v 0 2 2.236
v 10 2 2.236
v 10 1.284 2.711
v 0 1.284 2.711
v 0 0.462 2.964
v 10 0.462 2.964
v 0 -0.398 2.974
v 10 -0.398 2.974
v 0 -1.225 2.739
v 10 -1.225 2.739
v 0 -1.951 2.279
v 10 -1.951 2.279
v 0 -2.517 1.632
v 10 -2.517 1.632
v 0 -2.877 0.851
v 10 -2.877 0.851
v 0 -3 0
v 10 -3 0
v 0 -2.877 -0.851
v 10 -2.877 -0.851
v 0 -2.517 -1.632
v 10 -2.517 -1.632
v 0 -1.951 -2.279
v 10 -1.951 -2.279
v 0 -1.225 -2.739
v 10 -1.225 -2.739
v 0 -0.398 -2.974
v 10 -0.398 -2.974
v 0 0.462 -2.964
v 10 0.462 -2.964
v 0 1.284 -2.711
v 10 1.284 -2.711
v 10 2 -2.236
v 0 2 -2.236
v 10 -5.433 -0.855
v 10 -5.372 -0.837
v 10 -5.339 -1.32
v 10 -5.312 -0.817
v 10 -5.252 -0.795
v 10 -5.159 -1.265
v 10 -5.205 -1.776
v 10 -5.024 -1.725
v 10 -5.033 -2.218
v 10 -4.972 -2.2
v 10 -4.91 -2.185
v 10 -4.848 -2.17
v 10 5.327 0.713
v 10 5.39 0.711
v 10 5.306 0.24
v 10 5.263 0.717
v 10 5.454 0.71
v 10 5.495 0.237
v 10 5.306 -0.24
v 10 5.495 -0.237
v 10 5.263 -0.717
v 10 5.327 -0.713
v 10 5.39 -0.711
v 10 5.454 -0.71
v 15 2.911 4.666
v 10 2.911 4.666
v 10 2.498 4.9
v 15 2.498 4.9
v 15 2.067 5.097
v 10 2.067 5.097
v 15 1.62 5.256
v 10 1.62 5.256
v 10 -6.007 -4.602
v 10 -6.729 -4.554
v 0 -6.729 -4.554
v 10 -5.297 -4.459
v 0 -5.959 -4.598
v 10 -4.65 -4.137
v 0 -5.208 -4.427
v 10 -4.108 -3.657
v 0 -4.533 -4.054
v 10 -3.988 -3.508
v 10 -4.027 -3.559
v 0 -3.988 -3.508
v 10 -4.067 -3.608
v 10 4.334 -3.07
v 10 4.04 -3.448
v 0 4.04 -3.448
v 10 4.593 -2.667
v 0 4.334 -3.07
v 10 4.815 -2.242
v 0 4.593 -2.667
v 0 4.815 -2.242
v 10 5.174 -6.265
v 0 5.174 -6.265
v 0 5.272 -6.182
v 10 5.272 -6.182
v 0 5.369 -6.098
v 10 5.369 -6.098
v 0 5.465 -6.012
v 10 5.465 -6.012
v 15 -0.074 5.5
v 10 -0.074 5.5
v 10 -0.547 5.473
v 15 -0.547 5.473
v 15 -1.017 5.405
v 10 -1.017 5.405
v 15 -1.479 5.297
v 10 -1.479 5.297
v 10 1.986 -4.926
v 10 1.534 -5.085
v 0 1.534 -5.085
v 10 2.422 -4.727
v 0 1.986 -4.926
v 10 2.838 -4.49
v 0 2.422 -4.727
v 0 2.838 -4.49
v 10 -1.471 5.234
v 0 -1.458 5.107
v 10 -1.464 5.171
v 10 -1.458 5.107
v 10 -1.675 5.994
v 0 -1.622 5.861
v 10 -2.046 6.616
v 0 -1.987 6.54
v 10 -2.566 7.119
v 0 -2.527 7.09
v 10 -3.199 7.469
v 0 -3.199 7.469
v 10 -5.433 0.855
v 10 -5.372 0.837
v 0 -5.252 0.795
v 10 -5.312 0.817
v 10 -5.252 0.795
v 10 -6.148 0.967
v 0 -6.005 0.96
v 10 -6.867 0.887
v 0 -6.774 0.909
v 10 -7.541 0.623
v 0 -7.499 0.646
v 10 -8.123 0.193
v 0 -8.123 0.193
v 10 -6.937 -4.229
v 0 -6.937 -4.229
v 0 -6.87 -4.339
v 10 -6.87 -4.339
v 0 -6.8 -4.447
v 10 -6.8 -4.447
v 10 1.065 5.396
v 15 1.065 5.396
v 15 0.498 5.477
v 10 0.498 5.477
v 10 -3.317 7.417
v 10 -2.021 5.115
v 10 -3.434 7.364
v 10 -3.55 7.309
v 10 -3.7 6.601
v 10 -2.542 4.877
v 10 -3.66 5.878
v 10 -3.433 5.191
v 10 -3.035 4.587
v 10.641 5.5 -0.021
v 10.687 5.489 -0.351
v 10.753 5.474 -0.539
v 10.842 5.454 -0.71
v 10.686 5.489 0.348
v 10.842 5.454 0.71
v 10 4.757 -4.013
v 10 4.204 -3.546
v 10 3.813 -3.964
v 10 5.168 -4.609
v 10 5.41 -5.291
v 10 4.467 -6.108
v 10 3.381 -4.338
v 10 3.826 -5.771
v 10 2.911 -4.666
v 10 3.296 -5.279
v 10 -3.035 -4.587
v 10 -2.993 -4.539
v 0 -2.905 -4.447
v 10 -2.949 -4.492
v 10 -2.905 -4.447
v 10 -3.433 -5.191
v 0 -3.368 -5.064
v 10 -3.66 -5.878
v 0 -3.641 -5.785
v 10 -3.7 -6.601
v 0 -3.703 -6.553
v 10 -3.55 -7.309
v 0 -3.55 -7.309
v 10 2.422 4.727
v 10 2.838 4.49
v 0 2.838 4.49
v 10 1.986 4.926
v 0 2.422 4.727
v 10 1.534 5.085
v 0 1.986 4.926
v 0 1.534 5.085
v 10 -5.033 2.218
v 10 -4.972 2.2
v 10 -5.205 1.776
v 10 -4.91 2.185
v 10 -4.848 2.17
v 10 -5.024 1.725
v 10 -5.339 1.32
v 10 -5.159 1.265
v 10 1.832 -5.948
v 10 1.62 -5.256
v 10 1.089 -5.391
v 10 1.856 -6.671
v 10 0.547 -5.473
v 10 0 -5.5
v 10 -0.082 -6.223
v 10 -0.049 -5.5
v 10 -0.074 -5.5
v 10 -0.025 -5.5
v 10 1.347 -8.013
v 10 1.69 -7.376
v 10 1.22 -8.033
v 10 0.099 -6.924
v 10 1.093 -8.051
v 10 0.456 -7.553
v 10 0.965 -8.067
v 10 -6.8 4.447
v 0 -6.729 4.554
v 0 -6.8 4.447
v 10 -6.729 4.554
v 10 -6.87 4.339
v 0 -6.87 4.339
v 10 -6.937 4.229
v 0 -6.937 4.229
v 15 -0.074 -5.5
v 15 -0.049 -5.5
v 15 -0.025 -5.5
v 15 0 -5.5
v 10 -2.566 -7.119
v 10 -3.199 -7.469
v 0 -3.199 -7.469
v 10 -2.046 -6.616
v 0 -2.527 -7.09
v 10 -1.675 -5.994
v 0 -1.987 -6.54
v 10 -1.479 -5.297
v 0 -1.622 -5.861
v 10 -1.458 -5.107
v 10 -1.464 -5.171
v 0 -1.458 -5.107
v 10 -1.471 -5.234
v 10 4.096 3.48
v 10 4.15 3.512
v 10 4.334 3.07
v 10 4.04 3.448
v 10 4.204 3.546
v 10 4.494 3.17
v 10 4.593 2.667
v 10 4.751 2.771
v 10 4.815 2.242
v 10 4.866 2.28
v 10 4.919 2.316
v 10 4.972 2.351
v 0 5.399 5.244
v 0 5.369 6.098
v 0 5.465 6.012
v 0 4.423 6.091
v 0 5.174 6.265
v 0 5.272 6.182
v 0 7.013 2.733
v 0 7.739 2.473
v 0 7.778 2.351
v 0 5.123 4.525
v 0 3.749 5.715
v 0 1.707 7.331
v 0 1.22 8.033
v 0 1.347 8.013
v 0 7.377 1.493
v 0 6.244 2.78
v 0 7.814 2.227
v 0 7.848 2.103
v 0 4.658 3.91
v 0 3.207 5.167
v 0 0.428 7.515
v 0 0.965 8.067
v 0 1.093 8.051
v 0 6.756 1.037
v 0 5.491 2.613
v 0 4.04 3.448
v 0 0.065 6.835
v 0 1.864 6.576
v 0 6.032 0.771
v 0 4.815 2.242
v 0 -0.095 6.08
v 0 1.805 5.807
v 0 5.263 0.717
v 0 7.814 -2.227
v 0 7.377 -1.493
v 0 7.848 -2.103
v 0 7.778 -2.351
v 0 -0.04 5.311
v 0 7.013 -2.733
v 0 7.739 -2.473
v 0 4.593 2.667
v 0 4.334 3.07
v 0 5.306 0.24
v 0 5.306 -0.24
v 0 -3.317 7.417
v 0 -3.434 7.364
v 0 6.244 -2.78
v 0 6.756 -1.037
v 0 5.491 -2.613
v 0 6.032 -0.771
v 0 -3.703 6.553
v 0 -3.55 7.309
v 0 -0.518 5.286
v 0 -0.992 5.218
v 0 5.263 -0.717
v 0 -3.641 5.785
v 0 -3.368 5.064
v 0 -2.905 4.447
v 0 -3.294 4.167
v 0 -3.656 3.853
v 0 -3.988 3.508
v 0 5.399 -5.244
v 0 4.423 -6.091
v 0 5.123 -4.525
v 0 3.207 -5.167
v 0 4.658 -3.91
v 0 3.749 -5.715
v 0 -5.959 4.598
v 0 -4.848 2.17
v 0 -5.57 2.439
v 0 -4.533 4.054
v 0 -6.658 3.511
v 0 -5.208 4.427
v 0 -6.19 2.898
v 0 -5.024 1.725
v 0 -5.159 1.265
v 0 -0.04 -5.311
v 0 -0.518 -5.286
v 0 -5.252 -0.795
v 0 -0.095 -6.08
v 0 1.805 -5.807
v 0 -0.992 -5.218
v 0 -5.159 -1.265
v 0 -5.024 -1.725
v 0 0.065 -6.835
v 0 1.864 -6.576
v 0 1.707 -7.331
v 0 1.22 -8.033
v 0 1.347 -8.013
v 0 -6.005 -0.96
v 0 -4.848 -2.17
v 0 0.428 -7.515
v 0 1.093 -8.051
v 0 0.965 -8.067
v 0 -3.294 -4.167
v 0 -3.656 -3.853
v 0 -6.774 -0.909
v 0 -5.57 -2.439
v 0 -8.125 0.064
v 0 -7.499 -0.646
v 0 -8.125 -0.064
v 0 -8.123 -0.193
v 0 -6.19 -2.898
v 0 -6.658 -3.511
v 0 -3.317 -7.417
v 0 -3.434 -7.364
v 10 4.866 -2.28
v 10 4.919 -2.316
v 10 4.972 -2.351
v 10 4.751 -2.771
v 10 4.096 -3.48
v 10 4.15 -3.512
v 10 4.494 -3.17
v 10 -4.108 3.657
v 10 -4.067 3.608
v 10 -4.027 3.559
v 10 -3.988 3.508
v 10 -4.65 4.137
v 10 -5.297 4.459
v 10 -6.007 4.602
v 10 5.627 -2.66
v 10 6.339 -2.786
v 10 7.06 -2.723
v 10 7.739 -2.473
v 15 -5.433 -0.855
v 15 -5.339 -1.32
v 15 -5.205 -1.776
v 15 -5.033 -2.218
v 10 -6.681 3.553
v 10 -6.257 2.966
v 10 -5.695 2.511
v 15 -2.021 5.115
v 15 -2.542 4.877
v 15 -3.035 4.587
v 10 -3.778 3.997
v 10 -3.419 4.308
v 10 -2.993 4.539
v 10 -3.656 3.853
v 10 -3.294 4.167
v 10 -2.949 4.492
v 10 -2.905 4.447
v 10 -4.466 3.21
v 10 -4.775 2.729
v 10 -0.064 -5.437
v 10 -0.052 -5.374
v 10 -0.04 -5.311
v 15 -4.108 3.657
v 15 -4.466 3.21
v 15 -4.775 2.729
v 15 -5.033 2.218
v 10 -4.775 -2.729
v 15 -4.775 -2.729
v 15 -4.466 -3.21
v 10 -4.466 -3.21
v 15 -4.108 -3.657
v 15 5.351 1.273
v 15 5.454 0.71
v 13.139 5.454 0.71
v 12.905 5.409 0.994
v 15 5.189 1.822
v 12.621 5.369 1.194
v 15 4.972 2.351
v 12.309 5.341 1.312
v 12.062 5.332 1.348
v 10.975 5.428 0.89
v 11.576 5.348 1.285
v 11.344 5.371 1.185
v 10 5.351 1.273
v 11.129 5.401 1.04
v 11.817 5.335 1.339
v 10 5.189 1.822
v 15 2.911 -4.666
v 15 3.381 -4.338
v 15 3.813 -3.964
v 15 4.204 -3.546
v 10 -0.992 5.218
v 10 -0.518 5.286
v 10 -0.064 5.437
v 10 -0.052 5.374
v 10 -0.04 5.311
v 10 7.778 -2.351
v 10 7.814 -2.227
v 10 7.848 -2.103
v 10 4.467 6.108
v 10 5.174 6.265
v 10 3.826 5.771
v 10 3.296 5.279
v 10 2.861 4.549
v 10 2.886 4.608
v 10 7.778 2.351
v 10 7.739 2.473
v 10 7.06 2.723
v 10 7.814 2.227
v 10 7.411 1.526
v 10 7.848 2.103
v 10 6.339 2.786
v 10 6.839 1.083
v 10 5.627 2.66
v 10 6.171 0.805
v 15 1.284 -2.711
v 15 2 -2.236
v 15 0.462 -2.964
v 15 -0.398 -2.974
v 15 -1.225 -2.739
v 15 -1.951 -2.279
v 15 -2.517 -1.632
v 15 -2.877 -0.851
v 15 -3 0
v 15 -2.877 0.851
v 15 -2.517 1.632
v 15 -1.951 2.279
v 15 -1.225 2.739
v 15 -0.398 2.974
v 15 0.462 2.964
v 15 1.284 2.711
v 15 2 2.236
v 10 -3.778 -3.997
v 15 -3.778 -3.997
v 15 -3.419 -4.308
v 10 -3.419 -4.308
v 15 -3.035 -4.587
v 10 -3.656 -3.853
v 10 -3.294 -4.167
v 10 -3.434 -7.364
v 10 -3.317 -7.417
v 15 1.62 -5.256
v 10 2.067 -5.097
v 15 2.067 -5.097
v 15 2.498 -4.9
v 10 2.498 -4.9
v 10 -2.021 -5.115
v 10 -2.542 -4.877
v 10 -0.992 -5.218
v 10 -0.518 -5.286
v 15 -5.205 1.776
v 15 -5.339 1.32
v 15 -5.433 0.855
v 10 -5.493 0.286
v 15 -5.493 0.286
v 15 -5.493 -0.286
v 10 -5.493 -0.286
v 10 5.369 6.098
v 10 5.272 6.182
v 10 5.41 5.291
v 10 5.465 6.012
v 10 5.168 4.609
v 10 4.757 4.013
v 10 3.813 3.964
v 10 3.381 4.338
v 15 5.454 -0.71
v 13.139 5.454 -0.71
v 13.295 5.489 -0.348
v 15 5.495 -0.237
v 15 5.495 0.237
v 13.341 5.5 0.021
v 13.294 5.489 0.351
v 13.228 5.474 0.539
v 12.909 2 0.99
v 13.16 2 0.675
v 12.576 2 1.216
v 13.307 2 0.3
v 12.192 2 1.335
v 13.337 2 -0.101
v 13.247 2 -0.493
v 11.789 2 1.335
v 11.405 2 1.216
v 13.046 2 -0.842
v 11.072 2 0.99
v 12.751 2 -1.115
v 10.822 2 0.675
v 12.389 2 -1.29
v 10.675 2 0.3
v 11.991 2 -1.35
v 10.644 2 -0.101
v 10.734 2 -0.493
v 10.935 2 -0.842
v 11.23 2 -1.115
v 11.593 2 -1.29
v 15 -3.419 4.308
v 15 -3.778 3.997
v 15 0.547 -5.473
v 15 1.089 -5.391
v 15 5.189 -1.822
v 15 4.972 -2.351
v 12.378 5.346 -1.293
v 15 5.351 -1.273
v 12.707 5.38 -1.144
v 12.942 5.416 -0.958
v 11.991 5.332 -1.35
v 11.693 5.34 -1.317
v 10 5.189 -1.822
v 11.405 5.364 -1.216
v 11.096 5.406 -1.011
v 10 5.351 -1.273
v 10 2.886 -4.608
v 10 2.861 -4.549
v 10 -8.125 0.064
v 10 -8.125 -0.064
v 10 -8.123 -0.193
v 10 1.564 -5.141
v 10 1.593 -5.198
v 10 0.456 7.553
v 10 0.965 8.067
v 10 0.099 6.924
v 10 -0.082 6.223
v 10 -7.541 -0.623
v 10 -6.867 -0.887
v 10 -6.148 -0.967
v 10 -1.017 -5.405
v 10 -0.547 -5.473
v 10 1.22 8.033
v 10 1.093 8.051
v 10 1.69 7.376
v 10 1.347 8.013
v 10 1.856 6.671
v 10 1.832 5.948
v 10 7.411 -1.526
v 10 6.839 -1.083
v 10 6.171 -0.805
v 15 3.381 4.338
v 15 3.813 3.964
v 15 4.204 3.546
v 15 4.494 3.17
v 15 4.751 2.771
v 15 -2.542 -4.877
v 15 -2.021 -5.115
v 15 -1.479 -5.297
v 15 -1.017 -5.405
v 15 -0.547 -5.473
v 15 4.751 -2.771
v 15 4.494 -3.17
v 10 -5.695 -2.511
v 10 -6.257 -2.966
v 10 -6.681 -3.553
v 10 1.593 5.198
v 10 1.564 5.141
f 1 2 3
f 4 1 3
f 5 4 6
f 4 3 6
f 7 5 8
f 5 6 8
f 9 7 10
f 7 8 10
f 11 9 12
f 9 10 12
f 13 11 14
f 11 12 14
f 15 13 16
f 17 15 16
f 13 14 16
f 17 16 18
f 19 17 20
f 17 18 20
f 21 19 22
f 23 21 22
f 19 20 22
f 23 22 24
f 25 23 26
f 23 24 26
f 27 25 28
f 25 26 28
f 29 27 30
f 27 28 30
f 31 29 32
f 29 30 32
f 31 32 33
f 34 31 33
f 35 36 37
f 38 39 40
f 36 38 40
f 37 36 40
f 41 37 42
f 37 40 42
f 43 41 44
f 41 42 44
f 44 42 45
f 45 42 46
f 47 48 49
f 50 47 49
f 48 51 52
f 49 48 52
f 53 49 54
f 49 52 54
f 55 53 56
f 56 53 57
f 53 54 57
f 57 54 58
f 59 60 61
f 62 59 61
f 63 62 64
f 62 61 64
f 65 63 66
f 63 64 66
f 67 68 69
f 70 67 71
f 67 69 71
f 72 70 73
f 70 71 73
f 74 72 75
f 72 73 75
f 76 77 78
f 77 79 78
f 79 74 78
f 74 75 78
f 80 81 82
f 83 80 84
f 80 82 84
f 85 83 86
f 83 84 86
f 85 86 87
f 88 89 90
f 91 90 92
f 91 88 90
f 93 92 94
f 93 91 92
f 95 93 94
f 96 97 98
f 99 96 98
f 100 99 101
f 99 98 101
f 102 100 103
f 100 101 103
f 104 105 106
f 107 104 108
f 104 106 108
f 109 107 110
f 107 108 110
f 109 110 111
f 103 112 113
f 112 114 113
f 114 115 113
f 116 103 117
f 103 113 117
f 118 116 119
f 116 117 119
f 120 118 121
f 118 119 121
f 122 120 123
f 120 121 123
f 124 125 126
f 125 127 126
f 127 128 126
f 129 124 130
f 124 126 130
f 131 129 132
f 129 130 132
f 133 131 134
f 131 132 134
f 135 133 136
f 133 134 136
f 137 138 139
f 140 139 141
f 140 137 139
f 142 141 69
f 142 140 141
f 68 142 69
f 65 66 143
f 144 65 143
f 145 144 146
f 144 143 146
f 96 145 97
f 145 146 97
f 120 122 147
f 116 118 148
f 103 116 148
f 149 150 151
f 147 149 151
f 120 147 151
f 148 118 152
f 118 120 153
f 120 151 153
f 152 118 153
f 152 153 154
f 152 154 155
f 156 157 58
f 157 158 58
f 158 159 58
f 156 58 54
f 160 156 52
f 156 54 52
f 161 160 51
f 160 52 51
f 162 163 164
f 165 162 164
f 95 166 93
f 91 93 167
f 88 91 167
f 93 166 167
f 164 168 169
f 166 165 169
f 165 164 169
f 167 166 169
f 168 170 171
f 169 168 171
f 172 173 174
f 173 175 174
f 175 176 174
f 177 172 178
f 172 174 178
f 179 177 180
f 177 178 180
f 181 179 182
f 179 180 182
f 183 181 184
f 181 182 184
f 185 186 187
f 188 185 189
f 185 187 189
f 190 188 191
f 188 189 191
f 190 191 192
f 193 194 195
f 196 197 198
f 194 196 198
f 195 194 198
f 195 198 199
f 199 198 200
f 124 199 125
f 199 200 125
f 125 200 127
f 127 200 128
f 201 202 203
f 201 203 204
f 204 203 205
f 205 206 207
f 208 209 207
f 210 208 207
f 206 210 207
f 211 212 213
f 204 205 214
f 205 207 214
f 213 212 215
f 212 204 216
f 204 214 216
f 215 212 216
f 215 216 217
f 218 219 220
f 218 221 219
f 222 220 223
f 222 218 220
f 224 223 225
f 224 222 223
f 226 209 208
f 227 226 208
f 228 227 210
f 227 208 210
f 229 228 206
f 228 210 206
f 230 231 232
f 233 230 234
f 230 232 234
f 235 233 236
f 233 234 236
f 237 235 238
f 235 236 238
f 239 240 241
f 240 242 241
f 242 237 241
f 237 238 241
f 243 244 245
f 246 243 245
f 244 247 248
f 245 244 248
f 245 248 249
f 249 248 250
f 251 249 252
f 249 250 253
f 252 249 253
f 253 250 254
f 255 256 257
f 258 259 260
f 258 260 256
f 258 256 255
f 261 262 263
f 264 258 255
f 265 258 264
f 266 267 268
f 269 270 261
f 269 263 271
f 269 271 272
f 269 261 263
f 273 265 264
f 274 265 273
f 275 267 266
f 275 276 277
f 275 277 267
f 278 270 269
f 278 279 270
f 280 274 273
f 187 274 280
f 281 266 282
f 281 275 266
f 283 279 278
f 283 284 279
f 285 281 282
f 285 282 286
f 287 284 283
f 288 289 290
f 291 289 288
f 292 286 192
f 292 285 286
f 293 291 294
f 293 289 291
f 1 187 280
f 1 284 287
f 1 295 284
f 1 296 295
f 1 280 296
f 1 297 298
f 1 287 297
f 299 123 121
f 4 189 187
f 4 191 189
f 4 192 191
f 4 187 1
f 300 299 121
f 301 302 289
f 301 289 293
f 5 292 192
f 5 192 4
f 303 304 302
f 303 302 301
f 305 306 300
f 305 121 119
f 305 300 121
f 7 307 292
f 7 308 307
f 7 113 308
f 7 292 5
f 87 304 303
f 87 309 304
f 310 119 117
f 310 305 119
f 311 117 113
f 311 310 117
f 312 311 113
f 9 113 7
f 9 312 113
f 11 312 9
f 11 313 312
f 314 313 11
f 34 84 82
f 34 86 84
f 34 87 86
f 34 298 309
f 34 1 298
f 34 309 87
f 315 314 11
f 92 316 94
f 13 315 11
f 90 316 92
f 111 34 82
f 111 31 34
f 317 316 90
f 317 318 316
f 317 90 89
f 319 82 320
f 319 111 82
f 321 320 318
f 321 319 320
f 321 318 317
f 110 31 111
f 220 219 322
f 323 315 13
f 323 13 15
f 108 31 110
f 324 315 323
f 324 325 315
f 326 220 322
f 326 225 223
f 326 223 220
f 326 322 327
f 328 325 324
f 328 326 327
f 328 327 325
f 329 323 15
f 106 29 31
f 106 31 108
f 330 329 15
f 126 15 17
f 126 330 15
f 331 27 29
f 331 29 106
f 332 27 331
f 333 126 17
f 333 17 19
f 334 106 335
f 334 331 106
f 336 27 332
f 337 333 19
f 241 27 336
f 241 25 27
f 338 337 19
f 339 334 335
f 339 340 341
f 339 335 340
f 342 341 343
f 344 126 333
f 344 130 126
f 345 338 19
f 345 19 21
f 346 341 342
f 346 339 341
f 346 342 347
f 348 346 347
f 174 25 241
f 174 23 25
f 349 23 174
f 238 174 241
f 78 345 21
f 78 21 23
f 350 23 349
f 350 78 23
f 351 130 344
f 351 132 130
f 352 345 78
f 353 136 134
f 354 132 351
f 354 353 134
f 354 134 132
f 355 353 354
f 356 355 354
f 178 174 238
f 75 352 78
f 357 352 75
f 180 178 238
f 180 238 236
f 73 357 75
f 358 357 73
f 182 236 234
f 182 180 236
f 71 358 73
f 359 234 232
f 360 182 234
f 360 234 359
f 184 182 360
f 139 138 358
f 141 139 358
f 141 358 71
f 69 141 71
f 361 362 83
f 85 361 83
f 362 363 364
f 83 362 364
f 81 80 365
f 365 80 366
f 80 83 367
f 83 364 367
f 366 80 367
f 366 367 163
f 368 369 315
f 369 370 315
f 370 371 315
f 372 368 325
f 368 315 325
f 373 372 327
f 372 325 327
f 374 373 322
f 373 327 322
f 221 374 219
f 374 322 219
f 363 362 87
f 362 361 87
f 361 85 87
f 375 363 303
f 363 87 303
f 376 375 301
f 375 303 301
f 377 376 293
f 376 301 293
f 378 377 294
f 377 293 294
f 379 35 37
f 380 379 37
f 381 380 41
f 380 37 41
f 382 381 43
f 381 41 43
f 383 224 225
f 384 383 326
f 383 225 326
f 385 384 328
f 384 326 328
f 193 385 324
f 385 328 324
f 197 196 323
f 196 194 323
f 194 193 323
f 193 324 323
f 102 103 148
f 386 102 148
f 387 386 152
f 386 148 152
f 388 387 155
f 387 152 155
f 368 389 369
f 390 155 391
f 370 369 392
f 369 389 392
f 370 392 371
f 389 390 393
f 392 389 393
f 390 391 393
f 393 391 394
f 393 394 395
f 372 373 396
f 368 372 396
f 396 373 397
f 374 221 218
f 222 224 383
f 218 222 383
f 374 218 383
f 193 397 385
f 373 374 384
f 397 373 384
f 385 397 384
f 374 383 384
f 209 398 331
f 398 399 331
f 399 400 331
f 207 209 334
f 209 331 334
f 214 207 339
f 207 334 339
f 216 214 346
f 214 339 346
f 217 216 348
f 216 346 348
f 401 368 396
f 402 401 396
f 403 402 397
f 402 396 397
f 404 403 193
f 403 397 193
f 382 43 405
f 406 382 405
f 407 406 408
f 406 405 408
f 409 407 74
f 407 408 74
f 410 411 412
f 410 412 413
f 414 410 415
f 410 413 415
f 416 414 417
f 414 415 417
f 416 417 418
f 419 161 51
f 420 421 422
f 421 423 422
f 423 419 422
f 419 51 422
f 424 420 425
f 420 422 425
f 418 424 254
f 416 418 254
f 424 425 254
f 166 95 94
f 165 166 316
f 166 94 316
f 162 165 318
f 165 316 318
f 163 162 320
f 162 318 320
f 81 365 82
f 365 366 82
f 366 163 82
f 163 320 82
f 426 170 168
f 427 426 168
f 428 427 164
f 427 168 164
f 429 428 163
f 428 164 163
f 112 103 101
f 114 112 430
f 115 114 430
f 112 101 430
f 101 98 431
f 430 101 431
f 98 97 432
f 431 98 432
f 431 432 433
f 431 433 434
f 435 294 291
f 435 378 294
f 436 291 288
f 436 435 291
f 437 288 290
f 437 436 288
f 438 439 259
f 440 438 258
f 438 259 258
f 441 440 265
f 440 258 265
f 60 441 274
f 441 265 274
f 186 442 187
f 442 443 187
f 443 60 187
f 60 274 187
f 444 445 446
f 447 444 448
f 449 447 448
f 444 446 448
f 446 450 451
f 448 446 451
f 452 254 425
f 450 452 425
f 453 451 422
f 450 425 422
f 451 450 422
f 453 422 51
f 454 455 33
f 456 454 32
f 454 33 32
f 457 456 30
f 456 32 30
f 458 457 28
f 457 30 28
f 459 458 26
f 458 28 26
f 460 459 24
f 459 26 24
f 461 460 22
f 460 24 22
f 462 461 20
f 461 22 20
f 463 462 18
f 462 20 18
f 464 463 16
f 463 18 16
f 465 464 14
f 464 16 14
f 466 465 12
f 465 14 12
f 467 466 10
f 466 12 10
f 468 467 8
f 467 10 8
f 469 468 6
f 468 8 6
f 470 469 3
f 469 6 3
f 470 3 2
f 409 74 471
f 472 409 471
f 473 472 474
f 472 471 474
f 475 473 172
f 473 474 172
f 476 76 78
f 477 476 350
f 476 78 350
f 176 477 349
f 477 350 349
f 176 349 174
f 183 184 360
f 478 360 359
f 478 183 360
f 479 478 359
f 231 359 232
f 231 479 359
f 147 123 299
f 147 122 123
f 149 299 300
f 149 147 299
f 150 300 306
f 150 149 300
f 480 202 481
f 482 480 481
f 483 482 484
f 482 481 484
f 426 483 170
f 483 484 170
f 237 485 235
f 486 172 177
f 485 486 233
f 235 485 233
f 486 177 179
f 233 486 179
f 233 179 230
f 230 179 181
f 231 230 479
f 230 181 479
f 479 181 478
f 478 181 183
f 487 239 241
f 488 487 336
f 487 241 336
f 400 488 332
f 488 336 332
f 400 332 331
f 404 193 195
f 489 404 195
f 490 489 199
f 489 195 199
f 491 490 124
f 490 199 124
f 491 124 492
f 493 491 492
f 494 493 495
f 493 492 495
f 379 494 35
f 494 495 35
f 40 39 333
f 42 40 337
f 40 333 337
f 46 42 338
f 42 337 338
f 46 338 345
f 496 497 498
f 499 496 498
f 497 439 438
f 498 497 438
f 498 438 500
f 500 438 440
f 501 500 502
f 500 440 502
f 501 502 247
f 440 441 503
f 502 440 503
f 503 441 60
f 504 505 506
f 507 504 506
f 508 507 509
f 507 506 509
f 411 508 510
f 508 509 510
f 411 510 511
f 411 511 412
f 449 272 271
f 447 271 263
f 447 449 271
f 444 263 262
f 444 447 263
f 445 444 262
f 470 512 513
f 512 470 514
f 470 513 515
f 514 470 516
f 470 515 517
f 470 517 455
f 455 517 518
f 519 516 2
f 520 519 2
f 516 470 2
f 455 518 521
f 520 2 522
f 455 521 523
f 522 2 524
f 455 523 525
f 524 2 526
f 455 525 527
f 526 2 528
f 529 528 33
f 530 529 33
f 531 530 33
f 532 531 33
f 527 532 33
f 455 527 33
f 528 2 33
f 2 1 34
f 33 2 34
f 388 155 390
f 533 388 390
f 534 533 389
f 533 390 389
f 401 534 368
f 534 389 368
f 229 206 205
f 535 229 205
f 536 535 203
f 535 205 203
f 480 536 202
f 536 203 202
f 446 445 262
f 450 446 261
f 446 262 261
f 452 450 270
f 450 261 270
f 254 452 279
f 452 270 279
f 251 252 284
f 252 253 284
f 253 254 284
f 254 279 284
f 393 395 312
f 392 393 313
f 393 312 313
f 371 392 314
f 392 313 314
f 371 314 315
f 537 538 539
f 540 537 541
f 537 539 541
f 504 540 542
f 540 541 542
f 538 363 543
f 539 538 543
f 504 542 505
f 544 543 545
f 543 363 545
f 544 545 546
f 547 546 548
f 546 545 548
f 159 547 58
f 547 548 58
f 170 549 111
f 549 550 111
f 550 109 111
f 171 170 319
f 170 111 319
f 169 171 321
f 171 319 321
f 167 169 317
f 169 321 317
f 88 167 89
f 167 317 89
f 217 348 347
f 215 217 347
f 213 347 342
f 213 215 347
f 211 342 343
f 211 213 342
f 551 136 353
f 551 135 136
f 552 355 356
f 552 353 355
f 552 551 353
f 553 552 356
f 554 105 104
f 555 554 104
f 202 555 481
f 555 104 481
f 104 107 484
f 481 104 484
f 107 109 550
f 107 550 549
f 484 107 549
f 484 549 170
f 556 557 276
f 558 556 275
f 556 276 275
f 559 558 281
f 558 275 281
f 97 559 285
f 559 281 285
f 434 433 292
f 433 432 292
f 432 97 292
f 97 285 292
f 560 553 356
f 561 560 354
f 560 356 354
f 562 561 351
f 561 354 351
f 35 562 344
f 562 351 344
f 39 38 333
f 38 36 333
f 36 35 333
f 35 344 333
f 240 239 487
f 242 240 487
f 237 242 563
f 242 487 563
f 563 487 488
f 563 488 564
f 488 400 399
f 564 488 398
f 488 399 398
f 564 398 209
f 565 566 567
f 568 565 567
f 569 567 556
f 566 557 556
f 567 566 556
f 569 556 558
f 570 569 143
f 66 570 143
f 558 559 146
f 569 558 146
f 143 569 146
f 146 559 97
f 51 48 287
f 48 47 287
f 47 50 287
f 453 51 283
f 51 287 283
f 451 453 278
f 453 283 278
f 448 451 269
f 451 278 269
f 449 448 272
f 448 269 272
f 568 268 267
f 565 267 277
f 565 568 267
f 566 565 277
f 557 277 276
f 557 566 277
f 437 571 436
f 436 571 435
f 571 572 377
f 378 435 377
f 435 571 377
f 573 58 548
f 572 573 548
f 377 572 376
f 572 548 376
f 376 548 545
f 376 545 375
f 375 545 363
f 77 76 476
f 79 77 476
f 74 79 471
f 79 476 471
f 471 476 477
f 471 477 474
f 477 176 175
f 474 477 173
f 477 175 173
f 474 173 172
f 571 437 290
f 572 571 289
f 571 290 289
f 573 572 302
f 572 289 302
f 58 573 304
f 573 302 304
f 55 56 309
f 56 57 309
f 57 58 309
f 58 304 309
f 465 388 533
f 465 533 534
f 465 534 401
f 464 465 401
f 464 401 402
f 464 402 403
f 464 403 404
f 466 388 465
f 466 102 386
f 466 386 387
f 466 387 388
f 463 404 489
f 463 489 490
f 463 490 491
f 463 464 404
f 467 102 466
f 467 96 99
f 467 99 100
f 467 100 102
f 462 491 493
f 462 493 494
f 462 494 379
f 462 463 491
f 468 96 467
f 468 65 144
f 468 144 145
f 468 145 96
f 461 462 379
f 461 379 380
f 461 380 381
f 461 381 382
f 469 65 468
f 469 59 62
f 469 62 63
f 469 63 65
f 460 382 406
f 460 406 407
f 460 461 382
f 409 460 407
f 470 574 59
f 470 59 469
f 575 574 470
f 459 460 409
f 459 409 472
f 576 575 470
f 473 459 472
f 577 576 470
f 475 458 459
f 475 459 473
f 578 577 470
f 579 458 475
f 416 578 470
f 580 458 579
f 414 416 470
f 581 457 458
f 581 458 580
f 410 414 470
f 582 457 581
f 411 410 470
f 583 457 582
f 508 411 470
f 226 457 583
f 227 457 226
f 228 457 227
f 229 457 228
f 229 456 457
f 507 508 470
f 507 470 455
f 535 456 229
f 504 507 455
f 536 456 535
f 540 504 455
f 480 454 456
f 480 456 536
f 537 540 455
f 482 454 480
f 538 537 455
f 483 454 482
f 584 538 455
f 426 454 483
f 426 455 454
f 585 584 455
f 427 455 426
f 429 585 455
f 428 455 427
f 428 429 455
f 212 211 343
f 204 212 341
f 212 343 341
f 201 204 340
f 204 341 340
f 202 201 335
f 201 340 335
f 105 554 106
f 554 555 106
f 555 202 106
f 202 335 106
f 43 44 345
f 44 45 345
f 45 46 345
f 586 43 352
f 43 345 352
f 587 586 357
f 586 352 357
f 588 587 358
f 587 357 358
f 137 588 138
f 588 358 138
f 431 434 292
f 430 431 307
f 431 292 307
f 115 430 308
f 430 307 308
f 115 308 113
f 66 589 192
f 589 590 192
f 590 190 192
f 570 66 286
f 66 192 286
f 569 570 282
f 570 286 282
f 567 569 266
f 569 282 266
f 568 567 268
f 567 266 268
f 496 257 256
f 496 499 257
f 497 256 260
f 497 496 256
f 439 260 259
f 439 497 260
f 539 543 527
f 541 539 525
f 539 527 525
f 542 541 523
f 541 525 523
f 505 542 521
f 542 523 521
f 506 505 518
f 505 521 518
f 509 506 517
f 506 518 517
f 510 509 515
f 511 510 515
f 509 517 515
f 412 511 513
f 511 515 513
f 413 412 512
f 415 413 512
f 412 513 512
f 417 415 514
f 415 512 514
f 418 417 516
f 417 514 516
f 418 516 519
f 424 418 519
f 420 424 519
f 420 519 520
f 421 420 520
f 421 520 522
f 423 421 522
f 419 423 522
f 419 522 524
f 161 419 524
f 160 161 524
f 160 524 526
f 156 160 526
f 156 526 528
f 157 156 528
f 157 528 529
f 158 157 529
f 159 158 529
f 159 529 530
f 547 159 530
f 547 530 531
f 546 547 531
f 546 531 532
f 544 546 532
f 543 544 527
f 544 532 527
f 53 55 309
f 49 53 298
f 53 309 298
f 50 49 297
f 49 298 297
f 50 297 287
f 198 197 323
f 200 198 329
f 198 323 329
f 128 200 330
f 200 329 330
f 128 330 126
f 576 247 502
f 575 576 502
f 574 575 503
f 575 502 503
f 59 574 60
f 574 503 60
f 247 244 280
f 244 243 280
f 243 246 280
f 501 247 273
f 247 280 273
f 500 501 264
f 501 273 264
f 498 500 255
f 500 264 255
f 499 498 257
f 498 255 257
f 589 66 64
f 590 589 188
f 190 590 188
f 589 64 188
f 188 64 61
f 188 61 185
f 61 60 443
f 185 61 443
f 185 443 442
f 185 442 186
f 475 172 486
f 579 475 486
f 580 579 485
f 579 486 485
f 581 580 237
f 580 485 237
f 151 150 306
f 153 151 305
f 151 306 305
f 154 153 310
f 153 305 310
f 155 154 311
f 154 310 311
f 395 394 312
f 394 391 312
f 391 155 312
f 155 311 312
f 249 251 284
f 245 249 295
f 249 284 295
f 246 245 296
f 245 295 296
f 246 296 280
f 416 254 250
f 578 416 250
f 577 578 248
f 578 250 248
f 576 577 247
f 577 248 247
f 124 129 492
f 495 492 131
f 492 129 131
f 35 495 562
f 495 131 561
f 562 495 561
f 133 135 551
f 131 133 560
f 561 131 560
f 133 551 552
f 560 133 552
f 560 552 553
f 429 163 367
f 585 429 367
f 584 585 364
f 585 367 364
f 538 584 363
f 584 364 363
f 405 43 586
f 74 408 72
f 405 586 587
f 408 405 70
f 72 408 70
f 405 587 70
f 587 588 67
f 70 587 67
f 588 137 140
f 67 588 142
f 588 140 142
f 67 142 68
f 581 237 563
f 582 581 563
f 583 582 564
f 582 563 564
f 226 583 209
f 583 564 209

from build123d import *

# Parameters (mm, degrees)
BASPROSKE_W              = 10
BASPROSKE_H              = 8.125
TOOTHCUT_DEPTH           = 16.232572009
TEETHCUTS_COUNT          = 11
TEETHCUTS_ANGLE          = 327.272727273
BORSKE_R                 = 3
BORE_DEPTH               = 50.0000508
RESSALTO_EXTRUS_O1_DEPTH = 10
RESSALTO_EXTRUS_O2_DEPTH = 5
ESBO_O3_R                = 1.35
CORTE_EXTRUS_O1_DEPTH    = 10


with BuildPart() as part:
    # BasProSke → Base-Revolve (revolve)
    with BuildSketch(Plane(origin=(0, 0, 0), x_dir=(1, 0, 0), z_dir=(0, 1, 0)), mode=Mode.PRIVATE) as base_revolve_sk:
        with Locations((5, 4.0625)):
            Rectangle(BASPROSKE_W, BASPROSKE_H)
    revolve(base_revolve_sk.sketch.rotate(Axis((-10, 0, 0), (1, 0, 0)), 180), axis=Axis((-10, 0, 0), (1, 0, 0)))

    # TooCutSke → ToothCut (cut, through all)
    with BuildSketch(Plane(origin=(0, 0, 0), x_dir=(0, 0, -1), z_dir=(1, 0, 0))):
        with BuildLine():
            ThreePointArc((0.716661614, 5.262929639), (0, 5.3115), (-0.716661614, 5.262929639))
            ThreePointArc((-0.716661614, 5.262929639), (-1.045232485, 6.771828733), (-2.135233901, 7.865735589))
            ThreePointArc((-2.135233901, 7.865735589), (0, 8.1504), (2.135233901, 7.865735589))
            ThreePointArc((2.135233901, 7.865735589), (1.045232485, 6.771828733), (0.716661614, 5.262929639))
        make_face()
    toothcut = extrude(amount=TOOTHCUT_DEPTH, mode=Mode.SUBTRACT)

    # TeethCuts: ToothCut ×11 about axis
    teethcuts_axis = Axis((-10, 0, 0), (1, 0, 0))
    for i in range(1, TEETHCUTS_COUNT):
        add(toothcut.rotate(teethcuts_axis, i * TEETHCUTS_ANGLE / (TEETHCUTS_COUNT - 1)), mode=Mode.SUBTRACT)

    # BorSke → Bore (cut, symmetric)
    with BuildSketch(Plane(origin=(0, 0, 0), x_dir=(0, 0, -1), z_dir=(1, 0, 0))):
        with Locations(Location((0, 0, 0), (0, 0, 180))):
            Circle(BORSKE_R)
    extrude(amount=BORE_DEPTH, both=True, mode=Mode.SUBTRACT)

    # Esboço1 → Ressalto-extrusão1 (add)
    with BuildSketch(Plane.ZY):
        with BuildLine():
            Line((-2.236067977, 2), (0, 2))
            Line((0, 2), (2.236067977, 2))
            ThreePointArc((2.236067977, 2), (0, 3), (-2.236067977, 2))
        make_face()
    extrude(amount=-RESSALTO_EXTRUS_O1_DEPTH)

    # Esboço2 → Ressalto-extrusão2 (add)
    with BuildSketch(Plane(origin=(10, 0, 0), x_dir=(0, 0, -1), z_dir=(1, 0, 0))):
        with BuildLine():
            ThreePointArc((5.499508602, -0.073519622), (5.499877149, -0.036760632), (5.5, 0))
            ThreePointArc((5.5, 0), (5.438664747, 0.819100589), (5.256026991, 1.619932181))
            ThreePointArc((5.256026991, 1.619932181), (5.169790583, 1.578653269), (5.085041182, 1.534401651))
            ThreePointArc((5.085041182, 1.534401651), (4.831510343, 2.206476842), (4.489617195, 2.838198318))
            ThreePointArc((4.489617195, 2.838198318), (4.578559391, 2.873268994), (4.666228749, 2.911410184))
            ThreePointArc((4.666228749, 2.911410184), (4.156622659, 3.601734037), (3.545849816, 4.204396399))
            ThreePointArc((3.545849816, 4.204396399), (3.495620198, 4.123047446), (3.448248696, 4.040001631))
            ThreePointArc((3.448248696, 4.040001631), (2.871613702, 4.46831814), (2.242460468, 4.814914672))
            ThreePointArc((2.242460468, 4.814914672), (2.298322765, 4.892503784), (2.351454238, 4.971987828))
            ThreePointArc((2.351454238, 4.971987828), (1.549529063, 5.277211355), (0.709890379, 5.453994467))
            ThreePointArc((0.709890379, 5.453994467), (0.711615099, 5.358403192), (0.716661614, 5.262929639))
            ThreePointArc((0.716661614, 5.262929639), (0, 5.3115), (-0.716661614, 5.262929639))
            ThreePointArc((-0.716661614, 5.262929639), (-0.711615099, 5.358403192), (-0.709890379, 5.453994467))
            ThreePointArc((-0.709890379, 5.453994467), (-1.549529063, 5.277211355), (-2.351454238, 4.971987828))
            ThreePointArc((-2.351454238, 4.971987828), (-2.298322765, 4.892503784), (-2.242460468, 4.814914672))
            ThreePointArc((-2.242460468, 4.814914672), (-2.871613702, 4.46831814), (-3.448248696, 4.040001631))
            ThreePointArc((-3.448248696, 4.040001631), (-3.495620198, 4.123047446), (-3.545849816, 4.204396399))
            ThreePointArc((-3.545849816, 4.204396399), (-4.156622659, 3.601734037), (-4.666228749, 2.911410184))
            ThreePointArc((-4.666228749, 2.911410184), (-4.578559391, 2.873268994), (-4.489617195, 2.838198318))
            ThreePointArc((-4.489617195, 2.838198318), (-4.831510343, 2.206476842), (-5.085041182, 1.534401651))
            ThreePointArc((-5.085041182, 1.534401651), (-5.169790583, 1.578653269), (-5.256026991, 1.619932181))
            ThreePointArc((-5.256026991, 1.619932181), (-5.44401793, 0.782731611), (-5.499508602, -0.073519622))
            ThreePointArc((-5.499508602, -0.073519622), (-5.405135761, -0.0582084), (-5.311352185, -0.039625949))
            ThreePointArc((-5.311352185, -0.039625949), (-5.257436589, -0.755905263), (-5.107369022, -1.458360012))
            ThreePointArc((-5.107369022, -1.458360012), (-5.202588986, -1.466952167), (-5.297452733, -1.478849059))
            ThreePointArc((-5.297452733, -1.478849059), (-5.002975974, -2.284782572), (-4.586733332, -3.035107468))
            ThreePointArc((-4.586733332, -3.035107468), (-4.515619718, -2.971205038), (-4.446770385, -2.904869256))
            ThreePointArc((-4.446770385, -2.904869256), (-4.014163864, -3.478292788), (-3.508143284, -3.988102675))
            ThreePointArc((-3.508143284, -3.988102675), (-3.583602145, -4.046810655), (-3.656974663, -4.108106171))
            ThreePointArc((-3.656974663, -4.108106171), (-2.973524496, -4.626894431), (-2.217702637, -5.033070138))
            ThreePointArc((-2.217702637, -5.033070138), (-2.19242632, -4.940865071), (-2.170370406, -4.8478371))
            ThreePointArc((-2.170370406, -4.8478371), (-1.496422476, -5.096346929), (-0.795106841, -5.251650918))
            ThreePointArc((-0.795106841, -5.251650918), (-0.826846944, -5.341835354), (-0.855432976, -5.433068601))
            ThreePointArc((-0.855432976, -5.433068601), (0, -5.5), (0.855432976, -5.433068601))
            ThreePointArc((0.855432976, -5.433068601), (0.826846944, -5.341835354), (0.795106841, -5.251650918))
            ThreePointArc((0.795106841, -5.251650918), (1.496422476, -5.096346929), (2.170370406, -4.8478371))
            ThreePointArc((2.170370406, -4.8478371), (2.19242632, -4.940865071), (2.217702637, -5.033070138))
            ThreePointArc((2.217702637, -5.033070138), (2.973524496, -4.626894431), (3.656974663, -4.108106171))
            ThreePointArc((3.656974663, -4.108106171), (3.583602145, -4.046810655), (3.508143284, -3.988102675))
            ThreePointArc((3.508143284, -3.988102675), (4.014163864, -3.478292788), (4.446770385, -2.904869256))
            ThreePointArc((4.446770385, -2.904869256), (4.515619718, -2.971205038), (4.586733332, -3.035107468))
            ThreePointArc((4.586733332, -3.035107468), (5.002975974, -2.284782572), (5.297452733, -1.478849059))
            ThreePointArc((5.297452733, -1.478849059), (5.202588986, -1.466952167), (5.107369022, -1.458360012))
            ThreePointArc((5.107369022, -1.458360012), (5.257436589, -0.755905263), (5.311352185, -0.039625949))
            ThreePointArc((5.311352185, -0.039625949), (5.405135761, -0.0582084), (5.499508602, -0.073519622))
        make_face()
        with BuildLine():
            Line((-2.236067977, 2), (2.236067977, 2))
            ThreePointArc((2.236067977, 2), (0, -3), (-2.236067977, 2))
        make_face(mode=Mode.SUBTRACT)
        with BuildLine():
            ThreePointArc((3.448248696, 4.040001631), (3.495620198, 4.123047446), (3.545849816, 4.204396399))
            ThreePointArc((3.545849816, 4.204396399), (2.973524496, 4.626894431), (2.351454238, 4.971987828))
            ThreePointArc((2.351454238, 4.971987828), (2.298322765, 4.892503784), (2.242460468, 4.814914672))
            ThreePointArc((2.242460468, 4.814914672), (2.871613702, 4.46831814), (3.448248696, 4.040001631))
        make_face()
        with BuildLine():
            ThreePointArc((0.716661614, 5.262929639), (0.711615099, 5.358403192), (0.709890379, 5.453994467))
            ThreePointArc((0.709890379, 5.453994467), (0, 5.5), (-0.709890379, 5.453994467))
            ThreePointArc((-0.709890379, 5.453994467), (-0.711615099, 5.358403192), (-0.716661614, 5.262929639))
            ThreePointArc((-0.716661614, 5.262929639), (0, 5.3115), (0.716661614, 5.262929639))
        make_face()
        with BuildLine():
            ThreePointArc((-2.242460468, 4.814914672), (-2.298322765, 4.892503784), (-2.351454238, 4.971987828))
            ThreePointArc((-2.351454238, 4.971987828), (-2.973524496, 4.626894431), (-3.545849816, 4.204396399))
            ThreePointArc((-3.545849816, 4.204396399), (-3.495620198, 4.123047446), (-3.448248696, 4.040001631))
            ThreePointArc((-3.448248696, 4.040001631), (-2.871613702, 4.46831814), (-2.242460468, 4.814914672))
        make_face()
        with BuildLine():
            ThreePointArc((-4.489617195, 2.838198318), (-4.578559391, 2.873268994), (-4.666228749, 2.911410184))
            ThreePointArc((-4.666228749, 2.911410184), (-5.002975974, 2.284782572), (-5.256026991, 1.619932181))
            ThreePointArc((-5.256026991, 1.619932181), (-5.169790583, 1.578653269), (-5.085041182, 1.534401651))
            ThreePointArc((-5.085041182, 1.534401651), (-4.831510343, 2.206476842), (-4.489617195, 2.838198318))
        make_face()
        with BuildLine():
            ThreePointArc((-5.311352185, -0.039625949), (-5.405135761, -0.0582084), (-5.499508602, -0.073519622))
            ThreePointArc((-5.499508602, -0.073519622), (-5.44401793, -0.782731611), (-5.297452733, -1.478849059))
            ThreePointArc((-5.297452733, -1.478849059), (-5.202588986, -1.466952167), (-5.107369022, -1.458360012))
            ThreePointArc((-5.107369022, -1.458360012), (-5.257436589, -0.755905263), (-5.311352185, -0.039625949))
        make_face()
        with BuildLine():
            ThreePointArc((-4.586733332, -3.035107468), (-4.156622659, -3.601734037), (-3.656974663, -4.108106171))
            ThreePointArc((-3.656974663, -4.108106171), (-3.583602145, -4.046810655), (-3.508143284, -3.988102675))
            ThreePointArc((-3.508143284, -3.988102675), (-4.014163864, -3.478292788), (-4.446770385, -2.904869256))
            ThreePointArc((-4.446770385, -2.904869256), (-4.515619718, -2.971205038), (-4.586733332, -3.035107468))
        make_face()
        with BuildLine():
            ThreePointArc((-2.217702637, -5.033070138), (-1.549529063, -5.277211355), (-0.855432976, -5.433068601))
            ThreePointArc((-0.855432976, -5.433068601), (-0.826846944, -5.341835354), (-0.795106841, -5.251650918))
            ThreePointArc((-0.795106841, -5.251650918), (-1.496422476, -5.096346929), (-2.170370406, -4.8478371))
            ThreePointArc((-2.170370406, -4.8478371), (-2.19242632, -4.940865071), (-2.217702637, -5.033070138))
        make_face()
        with BuildLine():
            ThreePointArc((0.855432976, -5.433068601), (1.549529063, -5.277211355), (2.217702637, -5.033070138))
            ThreePointArc((2.217702637, -5.033070138), (2.19242632, -4.940865071), (2.170370406, -4.8478371))
            ThreePointArc((2.170370406, -4.8478371), (1.496422476, -5.096346929), (0.795106841, -5.251650918))
            ThreePointArc((0.795106841, -5.251650918), (0.826846944, -5.341835354), (0.855432976, -5.433068601))
        make_face()
        with BuildLine():
            ThreePointArc((3.656974663, -4.108106171), (4.156622659, -3.601734037), (4.586733332, -3.035107468))
            ThreePointArc((4.586733332, -3.035107468), (4.515619718, -2.971205038), (4.446770385, -2.904869256))
            ThreePointArc((4.446770385, -2.904869256), (4.014163864, -3.478292788), (3.508143284, -3.988102675))
            ThreePointArc((3.508143284, -3.988102675), (3.583602145, -4.046810655), (3.656974663, -4.108106171))
        make_face()
        with BuildLine():
            ThreePointArc((5.297452733, -1.478849059), (5.44401793, -0.782731611), (5.499508602, -0.073519622))
            ThreePointArc((5.499508602, -0.073519622), (5.405135761, -0.0582084), (5.311352185, -0.039625949))
            ThreePointArc((5.311352185, -0.039625949), (5.257436589, -0.755905263), (5.107369022, -1.458360012))
            ThreePointArc((5.107369022, -1.458360012), (5.202588986, -1.466952167), (5.297452733, -1.478849059))
        make_face()
        with BuildLine():
            ThreePointArc((5.085041182, 1.534401651), (5.169790583, 1.578653269), (5.256026991, 1.619932181))
            ThreePointArc((5.256026991, 1.619932181), (5.002975974, 2.284782572), (4.666228749, 2.911410184))
            ThreePointArc((4.666228749, 2.911410184), (4.578559391, 2.873268994), (4.489617195, 2.838198318))
            ThreePointArc((4.489617195, 2.838198318), (4.831510343, 2.206476842), (5.085041182, 1.534401651))
        make_face()
    extrude(amount=RESSALTO_EXTRUS_O2_DEPTH)

    # Esboço3 → Corte-extrusão1 (cut)
    with BuildSketch(Plane.XZ.offset(-2)):
        with Locations(Location((11.990687454, 0, 0), (0, 0, 270))):
            Circle(ESBO_O3_R)
    extrude(amount=-CORTE_EXTRUS_O1_DEPTH, mode=Mode.SUBTRACT)


solid = part.part
